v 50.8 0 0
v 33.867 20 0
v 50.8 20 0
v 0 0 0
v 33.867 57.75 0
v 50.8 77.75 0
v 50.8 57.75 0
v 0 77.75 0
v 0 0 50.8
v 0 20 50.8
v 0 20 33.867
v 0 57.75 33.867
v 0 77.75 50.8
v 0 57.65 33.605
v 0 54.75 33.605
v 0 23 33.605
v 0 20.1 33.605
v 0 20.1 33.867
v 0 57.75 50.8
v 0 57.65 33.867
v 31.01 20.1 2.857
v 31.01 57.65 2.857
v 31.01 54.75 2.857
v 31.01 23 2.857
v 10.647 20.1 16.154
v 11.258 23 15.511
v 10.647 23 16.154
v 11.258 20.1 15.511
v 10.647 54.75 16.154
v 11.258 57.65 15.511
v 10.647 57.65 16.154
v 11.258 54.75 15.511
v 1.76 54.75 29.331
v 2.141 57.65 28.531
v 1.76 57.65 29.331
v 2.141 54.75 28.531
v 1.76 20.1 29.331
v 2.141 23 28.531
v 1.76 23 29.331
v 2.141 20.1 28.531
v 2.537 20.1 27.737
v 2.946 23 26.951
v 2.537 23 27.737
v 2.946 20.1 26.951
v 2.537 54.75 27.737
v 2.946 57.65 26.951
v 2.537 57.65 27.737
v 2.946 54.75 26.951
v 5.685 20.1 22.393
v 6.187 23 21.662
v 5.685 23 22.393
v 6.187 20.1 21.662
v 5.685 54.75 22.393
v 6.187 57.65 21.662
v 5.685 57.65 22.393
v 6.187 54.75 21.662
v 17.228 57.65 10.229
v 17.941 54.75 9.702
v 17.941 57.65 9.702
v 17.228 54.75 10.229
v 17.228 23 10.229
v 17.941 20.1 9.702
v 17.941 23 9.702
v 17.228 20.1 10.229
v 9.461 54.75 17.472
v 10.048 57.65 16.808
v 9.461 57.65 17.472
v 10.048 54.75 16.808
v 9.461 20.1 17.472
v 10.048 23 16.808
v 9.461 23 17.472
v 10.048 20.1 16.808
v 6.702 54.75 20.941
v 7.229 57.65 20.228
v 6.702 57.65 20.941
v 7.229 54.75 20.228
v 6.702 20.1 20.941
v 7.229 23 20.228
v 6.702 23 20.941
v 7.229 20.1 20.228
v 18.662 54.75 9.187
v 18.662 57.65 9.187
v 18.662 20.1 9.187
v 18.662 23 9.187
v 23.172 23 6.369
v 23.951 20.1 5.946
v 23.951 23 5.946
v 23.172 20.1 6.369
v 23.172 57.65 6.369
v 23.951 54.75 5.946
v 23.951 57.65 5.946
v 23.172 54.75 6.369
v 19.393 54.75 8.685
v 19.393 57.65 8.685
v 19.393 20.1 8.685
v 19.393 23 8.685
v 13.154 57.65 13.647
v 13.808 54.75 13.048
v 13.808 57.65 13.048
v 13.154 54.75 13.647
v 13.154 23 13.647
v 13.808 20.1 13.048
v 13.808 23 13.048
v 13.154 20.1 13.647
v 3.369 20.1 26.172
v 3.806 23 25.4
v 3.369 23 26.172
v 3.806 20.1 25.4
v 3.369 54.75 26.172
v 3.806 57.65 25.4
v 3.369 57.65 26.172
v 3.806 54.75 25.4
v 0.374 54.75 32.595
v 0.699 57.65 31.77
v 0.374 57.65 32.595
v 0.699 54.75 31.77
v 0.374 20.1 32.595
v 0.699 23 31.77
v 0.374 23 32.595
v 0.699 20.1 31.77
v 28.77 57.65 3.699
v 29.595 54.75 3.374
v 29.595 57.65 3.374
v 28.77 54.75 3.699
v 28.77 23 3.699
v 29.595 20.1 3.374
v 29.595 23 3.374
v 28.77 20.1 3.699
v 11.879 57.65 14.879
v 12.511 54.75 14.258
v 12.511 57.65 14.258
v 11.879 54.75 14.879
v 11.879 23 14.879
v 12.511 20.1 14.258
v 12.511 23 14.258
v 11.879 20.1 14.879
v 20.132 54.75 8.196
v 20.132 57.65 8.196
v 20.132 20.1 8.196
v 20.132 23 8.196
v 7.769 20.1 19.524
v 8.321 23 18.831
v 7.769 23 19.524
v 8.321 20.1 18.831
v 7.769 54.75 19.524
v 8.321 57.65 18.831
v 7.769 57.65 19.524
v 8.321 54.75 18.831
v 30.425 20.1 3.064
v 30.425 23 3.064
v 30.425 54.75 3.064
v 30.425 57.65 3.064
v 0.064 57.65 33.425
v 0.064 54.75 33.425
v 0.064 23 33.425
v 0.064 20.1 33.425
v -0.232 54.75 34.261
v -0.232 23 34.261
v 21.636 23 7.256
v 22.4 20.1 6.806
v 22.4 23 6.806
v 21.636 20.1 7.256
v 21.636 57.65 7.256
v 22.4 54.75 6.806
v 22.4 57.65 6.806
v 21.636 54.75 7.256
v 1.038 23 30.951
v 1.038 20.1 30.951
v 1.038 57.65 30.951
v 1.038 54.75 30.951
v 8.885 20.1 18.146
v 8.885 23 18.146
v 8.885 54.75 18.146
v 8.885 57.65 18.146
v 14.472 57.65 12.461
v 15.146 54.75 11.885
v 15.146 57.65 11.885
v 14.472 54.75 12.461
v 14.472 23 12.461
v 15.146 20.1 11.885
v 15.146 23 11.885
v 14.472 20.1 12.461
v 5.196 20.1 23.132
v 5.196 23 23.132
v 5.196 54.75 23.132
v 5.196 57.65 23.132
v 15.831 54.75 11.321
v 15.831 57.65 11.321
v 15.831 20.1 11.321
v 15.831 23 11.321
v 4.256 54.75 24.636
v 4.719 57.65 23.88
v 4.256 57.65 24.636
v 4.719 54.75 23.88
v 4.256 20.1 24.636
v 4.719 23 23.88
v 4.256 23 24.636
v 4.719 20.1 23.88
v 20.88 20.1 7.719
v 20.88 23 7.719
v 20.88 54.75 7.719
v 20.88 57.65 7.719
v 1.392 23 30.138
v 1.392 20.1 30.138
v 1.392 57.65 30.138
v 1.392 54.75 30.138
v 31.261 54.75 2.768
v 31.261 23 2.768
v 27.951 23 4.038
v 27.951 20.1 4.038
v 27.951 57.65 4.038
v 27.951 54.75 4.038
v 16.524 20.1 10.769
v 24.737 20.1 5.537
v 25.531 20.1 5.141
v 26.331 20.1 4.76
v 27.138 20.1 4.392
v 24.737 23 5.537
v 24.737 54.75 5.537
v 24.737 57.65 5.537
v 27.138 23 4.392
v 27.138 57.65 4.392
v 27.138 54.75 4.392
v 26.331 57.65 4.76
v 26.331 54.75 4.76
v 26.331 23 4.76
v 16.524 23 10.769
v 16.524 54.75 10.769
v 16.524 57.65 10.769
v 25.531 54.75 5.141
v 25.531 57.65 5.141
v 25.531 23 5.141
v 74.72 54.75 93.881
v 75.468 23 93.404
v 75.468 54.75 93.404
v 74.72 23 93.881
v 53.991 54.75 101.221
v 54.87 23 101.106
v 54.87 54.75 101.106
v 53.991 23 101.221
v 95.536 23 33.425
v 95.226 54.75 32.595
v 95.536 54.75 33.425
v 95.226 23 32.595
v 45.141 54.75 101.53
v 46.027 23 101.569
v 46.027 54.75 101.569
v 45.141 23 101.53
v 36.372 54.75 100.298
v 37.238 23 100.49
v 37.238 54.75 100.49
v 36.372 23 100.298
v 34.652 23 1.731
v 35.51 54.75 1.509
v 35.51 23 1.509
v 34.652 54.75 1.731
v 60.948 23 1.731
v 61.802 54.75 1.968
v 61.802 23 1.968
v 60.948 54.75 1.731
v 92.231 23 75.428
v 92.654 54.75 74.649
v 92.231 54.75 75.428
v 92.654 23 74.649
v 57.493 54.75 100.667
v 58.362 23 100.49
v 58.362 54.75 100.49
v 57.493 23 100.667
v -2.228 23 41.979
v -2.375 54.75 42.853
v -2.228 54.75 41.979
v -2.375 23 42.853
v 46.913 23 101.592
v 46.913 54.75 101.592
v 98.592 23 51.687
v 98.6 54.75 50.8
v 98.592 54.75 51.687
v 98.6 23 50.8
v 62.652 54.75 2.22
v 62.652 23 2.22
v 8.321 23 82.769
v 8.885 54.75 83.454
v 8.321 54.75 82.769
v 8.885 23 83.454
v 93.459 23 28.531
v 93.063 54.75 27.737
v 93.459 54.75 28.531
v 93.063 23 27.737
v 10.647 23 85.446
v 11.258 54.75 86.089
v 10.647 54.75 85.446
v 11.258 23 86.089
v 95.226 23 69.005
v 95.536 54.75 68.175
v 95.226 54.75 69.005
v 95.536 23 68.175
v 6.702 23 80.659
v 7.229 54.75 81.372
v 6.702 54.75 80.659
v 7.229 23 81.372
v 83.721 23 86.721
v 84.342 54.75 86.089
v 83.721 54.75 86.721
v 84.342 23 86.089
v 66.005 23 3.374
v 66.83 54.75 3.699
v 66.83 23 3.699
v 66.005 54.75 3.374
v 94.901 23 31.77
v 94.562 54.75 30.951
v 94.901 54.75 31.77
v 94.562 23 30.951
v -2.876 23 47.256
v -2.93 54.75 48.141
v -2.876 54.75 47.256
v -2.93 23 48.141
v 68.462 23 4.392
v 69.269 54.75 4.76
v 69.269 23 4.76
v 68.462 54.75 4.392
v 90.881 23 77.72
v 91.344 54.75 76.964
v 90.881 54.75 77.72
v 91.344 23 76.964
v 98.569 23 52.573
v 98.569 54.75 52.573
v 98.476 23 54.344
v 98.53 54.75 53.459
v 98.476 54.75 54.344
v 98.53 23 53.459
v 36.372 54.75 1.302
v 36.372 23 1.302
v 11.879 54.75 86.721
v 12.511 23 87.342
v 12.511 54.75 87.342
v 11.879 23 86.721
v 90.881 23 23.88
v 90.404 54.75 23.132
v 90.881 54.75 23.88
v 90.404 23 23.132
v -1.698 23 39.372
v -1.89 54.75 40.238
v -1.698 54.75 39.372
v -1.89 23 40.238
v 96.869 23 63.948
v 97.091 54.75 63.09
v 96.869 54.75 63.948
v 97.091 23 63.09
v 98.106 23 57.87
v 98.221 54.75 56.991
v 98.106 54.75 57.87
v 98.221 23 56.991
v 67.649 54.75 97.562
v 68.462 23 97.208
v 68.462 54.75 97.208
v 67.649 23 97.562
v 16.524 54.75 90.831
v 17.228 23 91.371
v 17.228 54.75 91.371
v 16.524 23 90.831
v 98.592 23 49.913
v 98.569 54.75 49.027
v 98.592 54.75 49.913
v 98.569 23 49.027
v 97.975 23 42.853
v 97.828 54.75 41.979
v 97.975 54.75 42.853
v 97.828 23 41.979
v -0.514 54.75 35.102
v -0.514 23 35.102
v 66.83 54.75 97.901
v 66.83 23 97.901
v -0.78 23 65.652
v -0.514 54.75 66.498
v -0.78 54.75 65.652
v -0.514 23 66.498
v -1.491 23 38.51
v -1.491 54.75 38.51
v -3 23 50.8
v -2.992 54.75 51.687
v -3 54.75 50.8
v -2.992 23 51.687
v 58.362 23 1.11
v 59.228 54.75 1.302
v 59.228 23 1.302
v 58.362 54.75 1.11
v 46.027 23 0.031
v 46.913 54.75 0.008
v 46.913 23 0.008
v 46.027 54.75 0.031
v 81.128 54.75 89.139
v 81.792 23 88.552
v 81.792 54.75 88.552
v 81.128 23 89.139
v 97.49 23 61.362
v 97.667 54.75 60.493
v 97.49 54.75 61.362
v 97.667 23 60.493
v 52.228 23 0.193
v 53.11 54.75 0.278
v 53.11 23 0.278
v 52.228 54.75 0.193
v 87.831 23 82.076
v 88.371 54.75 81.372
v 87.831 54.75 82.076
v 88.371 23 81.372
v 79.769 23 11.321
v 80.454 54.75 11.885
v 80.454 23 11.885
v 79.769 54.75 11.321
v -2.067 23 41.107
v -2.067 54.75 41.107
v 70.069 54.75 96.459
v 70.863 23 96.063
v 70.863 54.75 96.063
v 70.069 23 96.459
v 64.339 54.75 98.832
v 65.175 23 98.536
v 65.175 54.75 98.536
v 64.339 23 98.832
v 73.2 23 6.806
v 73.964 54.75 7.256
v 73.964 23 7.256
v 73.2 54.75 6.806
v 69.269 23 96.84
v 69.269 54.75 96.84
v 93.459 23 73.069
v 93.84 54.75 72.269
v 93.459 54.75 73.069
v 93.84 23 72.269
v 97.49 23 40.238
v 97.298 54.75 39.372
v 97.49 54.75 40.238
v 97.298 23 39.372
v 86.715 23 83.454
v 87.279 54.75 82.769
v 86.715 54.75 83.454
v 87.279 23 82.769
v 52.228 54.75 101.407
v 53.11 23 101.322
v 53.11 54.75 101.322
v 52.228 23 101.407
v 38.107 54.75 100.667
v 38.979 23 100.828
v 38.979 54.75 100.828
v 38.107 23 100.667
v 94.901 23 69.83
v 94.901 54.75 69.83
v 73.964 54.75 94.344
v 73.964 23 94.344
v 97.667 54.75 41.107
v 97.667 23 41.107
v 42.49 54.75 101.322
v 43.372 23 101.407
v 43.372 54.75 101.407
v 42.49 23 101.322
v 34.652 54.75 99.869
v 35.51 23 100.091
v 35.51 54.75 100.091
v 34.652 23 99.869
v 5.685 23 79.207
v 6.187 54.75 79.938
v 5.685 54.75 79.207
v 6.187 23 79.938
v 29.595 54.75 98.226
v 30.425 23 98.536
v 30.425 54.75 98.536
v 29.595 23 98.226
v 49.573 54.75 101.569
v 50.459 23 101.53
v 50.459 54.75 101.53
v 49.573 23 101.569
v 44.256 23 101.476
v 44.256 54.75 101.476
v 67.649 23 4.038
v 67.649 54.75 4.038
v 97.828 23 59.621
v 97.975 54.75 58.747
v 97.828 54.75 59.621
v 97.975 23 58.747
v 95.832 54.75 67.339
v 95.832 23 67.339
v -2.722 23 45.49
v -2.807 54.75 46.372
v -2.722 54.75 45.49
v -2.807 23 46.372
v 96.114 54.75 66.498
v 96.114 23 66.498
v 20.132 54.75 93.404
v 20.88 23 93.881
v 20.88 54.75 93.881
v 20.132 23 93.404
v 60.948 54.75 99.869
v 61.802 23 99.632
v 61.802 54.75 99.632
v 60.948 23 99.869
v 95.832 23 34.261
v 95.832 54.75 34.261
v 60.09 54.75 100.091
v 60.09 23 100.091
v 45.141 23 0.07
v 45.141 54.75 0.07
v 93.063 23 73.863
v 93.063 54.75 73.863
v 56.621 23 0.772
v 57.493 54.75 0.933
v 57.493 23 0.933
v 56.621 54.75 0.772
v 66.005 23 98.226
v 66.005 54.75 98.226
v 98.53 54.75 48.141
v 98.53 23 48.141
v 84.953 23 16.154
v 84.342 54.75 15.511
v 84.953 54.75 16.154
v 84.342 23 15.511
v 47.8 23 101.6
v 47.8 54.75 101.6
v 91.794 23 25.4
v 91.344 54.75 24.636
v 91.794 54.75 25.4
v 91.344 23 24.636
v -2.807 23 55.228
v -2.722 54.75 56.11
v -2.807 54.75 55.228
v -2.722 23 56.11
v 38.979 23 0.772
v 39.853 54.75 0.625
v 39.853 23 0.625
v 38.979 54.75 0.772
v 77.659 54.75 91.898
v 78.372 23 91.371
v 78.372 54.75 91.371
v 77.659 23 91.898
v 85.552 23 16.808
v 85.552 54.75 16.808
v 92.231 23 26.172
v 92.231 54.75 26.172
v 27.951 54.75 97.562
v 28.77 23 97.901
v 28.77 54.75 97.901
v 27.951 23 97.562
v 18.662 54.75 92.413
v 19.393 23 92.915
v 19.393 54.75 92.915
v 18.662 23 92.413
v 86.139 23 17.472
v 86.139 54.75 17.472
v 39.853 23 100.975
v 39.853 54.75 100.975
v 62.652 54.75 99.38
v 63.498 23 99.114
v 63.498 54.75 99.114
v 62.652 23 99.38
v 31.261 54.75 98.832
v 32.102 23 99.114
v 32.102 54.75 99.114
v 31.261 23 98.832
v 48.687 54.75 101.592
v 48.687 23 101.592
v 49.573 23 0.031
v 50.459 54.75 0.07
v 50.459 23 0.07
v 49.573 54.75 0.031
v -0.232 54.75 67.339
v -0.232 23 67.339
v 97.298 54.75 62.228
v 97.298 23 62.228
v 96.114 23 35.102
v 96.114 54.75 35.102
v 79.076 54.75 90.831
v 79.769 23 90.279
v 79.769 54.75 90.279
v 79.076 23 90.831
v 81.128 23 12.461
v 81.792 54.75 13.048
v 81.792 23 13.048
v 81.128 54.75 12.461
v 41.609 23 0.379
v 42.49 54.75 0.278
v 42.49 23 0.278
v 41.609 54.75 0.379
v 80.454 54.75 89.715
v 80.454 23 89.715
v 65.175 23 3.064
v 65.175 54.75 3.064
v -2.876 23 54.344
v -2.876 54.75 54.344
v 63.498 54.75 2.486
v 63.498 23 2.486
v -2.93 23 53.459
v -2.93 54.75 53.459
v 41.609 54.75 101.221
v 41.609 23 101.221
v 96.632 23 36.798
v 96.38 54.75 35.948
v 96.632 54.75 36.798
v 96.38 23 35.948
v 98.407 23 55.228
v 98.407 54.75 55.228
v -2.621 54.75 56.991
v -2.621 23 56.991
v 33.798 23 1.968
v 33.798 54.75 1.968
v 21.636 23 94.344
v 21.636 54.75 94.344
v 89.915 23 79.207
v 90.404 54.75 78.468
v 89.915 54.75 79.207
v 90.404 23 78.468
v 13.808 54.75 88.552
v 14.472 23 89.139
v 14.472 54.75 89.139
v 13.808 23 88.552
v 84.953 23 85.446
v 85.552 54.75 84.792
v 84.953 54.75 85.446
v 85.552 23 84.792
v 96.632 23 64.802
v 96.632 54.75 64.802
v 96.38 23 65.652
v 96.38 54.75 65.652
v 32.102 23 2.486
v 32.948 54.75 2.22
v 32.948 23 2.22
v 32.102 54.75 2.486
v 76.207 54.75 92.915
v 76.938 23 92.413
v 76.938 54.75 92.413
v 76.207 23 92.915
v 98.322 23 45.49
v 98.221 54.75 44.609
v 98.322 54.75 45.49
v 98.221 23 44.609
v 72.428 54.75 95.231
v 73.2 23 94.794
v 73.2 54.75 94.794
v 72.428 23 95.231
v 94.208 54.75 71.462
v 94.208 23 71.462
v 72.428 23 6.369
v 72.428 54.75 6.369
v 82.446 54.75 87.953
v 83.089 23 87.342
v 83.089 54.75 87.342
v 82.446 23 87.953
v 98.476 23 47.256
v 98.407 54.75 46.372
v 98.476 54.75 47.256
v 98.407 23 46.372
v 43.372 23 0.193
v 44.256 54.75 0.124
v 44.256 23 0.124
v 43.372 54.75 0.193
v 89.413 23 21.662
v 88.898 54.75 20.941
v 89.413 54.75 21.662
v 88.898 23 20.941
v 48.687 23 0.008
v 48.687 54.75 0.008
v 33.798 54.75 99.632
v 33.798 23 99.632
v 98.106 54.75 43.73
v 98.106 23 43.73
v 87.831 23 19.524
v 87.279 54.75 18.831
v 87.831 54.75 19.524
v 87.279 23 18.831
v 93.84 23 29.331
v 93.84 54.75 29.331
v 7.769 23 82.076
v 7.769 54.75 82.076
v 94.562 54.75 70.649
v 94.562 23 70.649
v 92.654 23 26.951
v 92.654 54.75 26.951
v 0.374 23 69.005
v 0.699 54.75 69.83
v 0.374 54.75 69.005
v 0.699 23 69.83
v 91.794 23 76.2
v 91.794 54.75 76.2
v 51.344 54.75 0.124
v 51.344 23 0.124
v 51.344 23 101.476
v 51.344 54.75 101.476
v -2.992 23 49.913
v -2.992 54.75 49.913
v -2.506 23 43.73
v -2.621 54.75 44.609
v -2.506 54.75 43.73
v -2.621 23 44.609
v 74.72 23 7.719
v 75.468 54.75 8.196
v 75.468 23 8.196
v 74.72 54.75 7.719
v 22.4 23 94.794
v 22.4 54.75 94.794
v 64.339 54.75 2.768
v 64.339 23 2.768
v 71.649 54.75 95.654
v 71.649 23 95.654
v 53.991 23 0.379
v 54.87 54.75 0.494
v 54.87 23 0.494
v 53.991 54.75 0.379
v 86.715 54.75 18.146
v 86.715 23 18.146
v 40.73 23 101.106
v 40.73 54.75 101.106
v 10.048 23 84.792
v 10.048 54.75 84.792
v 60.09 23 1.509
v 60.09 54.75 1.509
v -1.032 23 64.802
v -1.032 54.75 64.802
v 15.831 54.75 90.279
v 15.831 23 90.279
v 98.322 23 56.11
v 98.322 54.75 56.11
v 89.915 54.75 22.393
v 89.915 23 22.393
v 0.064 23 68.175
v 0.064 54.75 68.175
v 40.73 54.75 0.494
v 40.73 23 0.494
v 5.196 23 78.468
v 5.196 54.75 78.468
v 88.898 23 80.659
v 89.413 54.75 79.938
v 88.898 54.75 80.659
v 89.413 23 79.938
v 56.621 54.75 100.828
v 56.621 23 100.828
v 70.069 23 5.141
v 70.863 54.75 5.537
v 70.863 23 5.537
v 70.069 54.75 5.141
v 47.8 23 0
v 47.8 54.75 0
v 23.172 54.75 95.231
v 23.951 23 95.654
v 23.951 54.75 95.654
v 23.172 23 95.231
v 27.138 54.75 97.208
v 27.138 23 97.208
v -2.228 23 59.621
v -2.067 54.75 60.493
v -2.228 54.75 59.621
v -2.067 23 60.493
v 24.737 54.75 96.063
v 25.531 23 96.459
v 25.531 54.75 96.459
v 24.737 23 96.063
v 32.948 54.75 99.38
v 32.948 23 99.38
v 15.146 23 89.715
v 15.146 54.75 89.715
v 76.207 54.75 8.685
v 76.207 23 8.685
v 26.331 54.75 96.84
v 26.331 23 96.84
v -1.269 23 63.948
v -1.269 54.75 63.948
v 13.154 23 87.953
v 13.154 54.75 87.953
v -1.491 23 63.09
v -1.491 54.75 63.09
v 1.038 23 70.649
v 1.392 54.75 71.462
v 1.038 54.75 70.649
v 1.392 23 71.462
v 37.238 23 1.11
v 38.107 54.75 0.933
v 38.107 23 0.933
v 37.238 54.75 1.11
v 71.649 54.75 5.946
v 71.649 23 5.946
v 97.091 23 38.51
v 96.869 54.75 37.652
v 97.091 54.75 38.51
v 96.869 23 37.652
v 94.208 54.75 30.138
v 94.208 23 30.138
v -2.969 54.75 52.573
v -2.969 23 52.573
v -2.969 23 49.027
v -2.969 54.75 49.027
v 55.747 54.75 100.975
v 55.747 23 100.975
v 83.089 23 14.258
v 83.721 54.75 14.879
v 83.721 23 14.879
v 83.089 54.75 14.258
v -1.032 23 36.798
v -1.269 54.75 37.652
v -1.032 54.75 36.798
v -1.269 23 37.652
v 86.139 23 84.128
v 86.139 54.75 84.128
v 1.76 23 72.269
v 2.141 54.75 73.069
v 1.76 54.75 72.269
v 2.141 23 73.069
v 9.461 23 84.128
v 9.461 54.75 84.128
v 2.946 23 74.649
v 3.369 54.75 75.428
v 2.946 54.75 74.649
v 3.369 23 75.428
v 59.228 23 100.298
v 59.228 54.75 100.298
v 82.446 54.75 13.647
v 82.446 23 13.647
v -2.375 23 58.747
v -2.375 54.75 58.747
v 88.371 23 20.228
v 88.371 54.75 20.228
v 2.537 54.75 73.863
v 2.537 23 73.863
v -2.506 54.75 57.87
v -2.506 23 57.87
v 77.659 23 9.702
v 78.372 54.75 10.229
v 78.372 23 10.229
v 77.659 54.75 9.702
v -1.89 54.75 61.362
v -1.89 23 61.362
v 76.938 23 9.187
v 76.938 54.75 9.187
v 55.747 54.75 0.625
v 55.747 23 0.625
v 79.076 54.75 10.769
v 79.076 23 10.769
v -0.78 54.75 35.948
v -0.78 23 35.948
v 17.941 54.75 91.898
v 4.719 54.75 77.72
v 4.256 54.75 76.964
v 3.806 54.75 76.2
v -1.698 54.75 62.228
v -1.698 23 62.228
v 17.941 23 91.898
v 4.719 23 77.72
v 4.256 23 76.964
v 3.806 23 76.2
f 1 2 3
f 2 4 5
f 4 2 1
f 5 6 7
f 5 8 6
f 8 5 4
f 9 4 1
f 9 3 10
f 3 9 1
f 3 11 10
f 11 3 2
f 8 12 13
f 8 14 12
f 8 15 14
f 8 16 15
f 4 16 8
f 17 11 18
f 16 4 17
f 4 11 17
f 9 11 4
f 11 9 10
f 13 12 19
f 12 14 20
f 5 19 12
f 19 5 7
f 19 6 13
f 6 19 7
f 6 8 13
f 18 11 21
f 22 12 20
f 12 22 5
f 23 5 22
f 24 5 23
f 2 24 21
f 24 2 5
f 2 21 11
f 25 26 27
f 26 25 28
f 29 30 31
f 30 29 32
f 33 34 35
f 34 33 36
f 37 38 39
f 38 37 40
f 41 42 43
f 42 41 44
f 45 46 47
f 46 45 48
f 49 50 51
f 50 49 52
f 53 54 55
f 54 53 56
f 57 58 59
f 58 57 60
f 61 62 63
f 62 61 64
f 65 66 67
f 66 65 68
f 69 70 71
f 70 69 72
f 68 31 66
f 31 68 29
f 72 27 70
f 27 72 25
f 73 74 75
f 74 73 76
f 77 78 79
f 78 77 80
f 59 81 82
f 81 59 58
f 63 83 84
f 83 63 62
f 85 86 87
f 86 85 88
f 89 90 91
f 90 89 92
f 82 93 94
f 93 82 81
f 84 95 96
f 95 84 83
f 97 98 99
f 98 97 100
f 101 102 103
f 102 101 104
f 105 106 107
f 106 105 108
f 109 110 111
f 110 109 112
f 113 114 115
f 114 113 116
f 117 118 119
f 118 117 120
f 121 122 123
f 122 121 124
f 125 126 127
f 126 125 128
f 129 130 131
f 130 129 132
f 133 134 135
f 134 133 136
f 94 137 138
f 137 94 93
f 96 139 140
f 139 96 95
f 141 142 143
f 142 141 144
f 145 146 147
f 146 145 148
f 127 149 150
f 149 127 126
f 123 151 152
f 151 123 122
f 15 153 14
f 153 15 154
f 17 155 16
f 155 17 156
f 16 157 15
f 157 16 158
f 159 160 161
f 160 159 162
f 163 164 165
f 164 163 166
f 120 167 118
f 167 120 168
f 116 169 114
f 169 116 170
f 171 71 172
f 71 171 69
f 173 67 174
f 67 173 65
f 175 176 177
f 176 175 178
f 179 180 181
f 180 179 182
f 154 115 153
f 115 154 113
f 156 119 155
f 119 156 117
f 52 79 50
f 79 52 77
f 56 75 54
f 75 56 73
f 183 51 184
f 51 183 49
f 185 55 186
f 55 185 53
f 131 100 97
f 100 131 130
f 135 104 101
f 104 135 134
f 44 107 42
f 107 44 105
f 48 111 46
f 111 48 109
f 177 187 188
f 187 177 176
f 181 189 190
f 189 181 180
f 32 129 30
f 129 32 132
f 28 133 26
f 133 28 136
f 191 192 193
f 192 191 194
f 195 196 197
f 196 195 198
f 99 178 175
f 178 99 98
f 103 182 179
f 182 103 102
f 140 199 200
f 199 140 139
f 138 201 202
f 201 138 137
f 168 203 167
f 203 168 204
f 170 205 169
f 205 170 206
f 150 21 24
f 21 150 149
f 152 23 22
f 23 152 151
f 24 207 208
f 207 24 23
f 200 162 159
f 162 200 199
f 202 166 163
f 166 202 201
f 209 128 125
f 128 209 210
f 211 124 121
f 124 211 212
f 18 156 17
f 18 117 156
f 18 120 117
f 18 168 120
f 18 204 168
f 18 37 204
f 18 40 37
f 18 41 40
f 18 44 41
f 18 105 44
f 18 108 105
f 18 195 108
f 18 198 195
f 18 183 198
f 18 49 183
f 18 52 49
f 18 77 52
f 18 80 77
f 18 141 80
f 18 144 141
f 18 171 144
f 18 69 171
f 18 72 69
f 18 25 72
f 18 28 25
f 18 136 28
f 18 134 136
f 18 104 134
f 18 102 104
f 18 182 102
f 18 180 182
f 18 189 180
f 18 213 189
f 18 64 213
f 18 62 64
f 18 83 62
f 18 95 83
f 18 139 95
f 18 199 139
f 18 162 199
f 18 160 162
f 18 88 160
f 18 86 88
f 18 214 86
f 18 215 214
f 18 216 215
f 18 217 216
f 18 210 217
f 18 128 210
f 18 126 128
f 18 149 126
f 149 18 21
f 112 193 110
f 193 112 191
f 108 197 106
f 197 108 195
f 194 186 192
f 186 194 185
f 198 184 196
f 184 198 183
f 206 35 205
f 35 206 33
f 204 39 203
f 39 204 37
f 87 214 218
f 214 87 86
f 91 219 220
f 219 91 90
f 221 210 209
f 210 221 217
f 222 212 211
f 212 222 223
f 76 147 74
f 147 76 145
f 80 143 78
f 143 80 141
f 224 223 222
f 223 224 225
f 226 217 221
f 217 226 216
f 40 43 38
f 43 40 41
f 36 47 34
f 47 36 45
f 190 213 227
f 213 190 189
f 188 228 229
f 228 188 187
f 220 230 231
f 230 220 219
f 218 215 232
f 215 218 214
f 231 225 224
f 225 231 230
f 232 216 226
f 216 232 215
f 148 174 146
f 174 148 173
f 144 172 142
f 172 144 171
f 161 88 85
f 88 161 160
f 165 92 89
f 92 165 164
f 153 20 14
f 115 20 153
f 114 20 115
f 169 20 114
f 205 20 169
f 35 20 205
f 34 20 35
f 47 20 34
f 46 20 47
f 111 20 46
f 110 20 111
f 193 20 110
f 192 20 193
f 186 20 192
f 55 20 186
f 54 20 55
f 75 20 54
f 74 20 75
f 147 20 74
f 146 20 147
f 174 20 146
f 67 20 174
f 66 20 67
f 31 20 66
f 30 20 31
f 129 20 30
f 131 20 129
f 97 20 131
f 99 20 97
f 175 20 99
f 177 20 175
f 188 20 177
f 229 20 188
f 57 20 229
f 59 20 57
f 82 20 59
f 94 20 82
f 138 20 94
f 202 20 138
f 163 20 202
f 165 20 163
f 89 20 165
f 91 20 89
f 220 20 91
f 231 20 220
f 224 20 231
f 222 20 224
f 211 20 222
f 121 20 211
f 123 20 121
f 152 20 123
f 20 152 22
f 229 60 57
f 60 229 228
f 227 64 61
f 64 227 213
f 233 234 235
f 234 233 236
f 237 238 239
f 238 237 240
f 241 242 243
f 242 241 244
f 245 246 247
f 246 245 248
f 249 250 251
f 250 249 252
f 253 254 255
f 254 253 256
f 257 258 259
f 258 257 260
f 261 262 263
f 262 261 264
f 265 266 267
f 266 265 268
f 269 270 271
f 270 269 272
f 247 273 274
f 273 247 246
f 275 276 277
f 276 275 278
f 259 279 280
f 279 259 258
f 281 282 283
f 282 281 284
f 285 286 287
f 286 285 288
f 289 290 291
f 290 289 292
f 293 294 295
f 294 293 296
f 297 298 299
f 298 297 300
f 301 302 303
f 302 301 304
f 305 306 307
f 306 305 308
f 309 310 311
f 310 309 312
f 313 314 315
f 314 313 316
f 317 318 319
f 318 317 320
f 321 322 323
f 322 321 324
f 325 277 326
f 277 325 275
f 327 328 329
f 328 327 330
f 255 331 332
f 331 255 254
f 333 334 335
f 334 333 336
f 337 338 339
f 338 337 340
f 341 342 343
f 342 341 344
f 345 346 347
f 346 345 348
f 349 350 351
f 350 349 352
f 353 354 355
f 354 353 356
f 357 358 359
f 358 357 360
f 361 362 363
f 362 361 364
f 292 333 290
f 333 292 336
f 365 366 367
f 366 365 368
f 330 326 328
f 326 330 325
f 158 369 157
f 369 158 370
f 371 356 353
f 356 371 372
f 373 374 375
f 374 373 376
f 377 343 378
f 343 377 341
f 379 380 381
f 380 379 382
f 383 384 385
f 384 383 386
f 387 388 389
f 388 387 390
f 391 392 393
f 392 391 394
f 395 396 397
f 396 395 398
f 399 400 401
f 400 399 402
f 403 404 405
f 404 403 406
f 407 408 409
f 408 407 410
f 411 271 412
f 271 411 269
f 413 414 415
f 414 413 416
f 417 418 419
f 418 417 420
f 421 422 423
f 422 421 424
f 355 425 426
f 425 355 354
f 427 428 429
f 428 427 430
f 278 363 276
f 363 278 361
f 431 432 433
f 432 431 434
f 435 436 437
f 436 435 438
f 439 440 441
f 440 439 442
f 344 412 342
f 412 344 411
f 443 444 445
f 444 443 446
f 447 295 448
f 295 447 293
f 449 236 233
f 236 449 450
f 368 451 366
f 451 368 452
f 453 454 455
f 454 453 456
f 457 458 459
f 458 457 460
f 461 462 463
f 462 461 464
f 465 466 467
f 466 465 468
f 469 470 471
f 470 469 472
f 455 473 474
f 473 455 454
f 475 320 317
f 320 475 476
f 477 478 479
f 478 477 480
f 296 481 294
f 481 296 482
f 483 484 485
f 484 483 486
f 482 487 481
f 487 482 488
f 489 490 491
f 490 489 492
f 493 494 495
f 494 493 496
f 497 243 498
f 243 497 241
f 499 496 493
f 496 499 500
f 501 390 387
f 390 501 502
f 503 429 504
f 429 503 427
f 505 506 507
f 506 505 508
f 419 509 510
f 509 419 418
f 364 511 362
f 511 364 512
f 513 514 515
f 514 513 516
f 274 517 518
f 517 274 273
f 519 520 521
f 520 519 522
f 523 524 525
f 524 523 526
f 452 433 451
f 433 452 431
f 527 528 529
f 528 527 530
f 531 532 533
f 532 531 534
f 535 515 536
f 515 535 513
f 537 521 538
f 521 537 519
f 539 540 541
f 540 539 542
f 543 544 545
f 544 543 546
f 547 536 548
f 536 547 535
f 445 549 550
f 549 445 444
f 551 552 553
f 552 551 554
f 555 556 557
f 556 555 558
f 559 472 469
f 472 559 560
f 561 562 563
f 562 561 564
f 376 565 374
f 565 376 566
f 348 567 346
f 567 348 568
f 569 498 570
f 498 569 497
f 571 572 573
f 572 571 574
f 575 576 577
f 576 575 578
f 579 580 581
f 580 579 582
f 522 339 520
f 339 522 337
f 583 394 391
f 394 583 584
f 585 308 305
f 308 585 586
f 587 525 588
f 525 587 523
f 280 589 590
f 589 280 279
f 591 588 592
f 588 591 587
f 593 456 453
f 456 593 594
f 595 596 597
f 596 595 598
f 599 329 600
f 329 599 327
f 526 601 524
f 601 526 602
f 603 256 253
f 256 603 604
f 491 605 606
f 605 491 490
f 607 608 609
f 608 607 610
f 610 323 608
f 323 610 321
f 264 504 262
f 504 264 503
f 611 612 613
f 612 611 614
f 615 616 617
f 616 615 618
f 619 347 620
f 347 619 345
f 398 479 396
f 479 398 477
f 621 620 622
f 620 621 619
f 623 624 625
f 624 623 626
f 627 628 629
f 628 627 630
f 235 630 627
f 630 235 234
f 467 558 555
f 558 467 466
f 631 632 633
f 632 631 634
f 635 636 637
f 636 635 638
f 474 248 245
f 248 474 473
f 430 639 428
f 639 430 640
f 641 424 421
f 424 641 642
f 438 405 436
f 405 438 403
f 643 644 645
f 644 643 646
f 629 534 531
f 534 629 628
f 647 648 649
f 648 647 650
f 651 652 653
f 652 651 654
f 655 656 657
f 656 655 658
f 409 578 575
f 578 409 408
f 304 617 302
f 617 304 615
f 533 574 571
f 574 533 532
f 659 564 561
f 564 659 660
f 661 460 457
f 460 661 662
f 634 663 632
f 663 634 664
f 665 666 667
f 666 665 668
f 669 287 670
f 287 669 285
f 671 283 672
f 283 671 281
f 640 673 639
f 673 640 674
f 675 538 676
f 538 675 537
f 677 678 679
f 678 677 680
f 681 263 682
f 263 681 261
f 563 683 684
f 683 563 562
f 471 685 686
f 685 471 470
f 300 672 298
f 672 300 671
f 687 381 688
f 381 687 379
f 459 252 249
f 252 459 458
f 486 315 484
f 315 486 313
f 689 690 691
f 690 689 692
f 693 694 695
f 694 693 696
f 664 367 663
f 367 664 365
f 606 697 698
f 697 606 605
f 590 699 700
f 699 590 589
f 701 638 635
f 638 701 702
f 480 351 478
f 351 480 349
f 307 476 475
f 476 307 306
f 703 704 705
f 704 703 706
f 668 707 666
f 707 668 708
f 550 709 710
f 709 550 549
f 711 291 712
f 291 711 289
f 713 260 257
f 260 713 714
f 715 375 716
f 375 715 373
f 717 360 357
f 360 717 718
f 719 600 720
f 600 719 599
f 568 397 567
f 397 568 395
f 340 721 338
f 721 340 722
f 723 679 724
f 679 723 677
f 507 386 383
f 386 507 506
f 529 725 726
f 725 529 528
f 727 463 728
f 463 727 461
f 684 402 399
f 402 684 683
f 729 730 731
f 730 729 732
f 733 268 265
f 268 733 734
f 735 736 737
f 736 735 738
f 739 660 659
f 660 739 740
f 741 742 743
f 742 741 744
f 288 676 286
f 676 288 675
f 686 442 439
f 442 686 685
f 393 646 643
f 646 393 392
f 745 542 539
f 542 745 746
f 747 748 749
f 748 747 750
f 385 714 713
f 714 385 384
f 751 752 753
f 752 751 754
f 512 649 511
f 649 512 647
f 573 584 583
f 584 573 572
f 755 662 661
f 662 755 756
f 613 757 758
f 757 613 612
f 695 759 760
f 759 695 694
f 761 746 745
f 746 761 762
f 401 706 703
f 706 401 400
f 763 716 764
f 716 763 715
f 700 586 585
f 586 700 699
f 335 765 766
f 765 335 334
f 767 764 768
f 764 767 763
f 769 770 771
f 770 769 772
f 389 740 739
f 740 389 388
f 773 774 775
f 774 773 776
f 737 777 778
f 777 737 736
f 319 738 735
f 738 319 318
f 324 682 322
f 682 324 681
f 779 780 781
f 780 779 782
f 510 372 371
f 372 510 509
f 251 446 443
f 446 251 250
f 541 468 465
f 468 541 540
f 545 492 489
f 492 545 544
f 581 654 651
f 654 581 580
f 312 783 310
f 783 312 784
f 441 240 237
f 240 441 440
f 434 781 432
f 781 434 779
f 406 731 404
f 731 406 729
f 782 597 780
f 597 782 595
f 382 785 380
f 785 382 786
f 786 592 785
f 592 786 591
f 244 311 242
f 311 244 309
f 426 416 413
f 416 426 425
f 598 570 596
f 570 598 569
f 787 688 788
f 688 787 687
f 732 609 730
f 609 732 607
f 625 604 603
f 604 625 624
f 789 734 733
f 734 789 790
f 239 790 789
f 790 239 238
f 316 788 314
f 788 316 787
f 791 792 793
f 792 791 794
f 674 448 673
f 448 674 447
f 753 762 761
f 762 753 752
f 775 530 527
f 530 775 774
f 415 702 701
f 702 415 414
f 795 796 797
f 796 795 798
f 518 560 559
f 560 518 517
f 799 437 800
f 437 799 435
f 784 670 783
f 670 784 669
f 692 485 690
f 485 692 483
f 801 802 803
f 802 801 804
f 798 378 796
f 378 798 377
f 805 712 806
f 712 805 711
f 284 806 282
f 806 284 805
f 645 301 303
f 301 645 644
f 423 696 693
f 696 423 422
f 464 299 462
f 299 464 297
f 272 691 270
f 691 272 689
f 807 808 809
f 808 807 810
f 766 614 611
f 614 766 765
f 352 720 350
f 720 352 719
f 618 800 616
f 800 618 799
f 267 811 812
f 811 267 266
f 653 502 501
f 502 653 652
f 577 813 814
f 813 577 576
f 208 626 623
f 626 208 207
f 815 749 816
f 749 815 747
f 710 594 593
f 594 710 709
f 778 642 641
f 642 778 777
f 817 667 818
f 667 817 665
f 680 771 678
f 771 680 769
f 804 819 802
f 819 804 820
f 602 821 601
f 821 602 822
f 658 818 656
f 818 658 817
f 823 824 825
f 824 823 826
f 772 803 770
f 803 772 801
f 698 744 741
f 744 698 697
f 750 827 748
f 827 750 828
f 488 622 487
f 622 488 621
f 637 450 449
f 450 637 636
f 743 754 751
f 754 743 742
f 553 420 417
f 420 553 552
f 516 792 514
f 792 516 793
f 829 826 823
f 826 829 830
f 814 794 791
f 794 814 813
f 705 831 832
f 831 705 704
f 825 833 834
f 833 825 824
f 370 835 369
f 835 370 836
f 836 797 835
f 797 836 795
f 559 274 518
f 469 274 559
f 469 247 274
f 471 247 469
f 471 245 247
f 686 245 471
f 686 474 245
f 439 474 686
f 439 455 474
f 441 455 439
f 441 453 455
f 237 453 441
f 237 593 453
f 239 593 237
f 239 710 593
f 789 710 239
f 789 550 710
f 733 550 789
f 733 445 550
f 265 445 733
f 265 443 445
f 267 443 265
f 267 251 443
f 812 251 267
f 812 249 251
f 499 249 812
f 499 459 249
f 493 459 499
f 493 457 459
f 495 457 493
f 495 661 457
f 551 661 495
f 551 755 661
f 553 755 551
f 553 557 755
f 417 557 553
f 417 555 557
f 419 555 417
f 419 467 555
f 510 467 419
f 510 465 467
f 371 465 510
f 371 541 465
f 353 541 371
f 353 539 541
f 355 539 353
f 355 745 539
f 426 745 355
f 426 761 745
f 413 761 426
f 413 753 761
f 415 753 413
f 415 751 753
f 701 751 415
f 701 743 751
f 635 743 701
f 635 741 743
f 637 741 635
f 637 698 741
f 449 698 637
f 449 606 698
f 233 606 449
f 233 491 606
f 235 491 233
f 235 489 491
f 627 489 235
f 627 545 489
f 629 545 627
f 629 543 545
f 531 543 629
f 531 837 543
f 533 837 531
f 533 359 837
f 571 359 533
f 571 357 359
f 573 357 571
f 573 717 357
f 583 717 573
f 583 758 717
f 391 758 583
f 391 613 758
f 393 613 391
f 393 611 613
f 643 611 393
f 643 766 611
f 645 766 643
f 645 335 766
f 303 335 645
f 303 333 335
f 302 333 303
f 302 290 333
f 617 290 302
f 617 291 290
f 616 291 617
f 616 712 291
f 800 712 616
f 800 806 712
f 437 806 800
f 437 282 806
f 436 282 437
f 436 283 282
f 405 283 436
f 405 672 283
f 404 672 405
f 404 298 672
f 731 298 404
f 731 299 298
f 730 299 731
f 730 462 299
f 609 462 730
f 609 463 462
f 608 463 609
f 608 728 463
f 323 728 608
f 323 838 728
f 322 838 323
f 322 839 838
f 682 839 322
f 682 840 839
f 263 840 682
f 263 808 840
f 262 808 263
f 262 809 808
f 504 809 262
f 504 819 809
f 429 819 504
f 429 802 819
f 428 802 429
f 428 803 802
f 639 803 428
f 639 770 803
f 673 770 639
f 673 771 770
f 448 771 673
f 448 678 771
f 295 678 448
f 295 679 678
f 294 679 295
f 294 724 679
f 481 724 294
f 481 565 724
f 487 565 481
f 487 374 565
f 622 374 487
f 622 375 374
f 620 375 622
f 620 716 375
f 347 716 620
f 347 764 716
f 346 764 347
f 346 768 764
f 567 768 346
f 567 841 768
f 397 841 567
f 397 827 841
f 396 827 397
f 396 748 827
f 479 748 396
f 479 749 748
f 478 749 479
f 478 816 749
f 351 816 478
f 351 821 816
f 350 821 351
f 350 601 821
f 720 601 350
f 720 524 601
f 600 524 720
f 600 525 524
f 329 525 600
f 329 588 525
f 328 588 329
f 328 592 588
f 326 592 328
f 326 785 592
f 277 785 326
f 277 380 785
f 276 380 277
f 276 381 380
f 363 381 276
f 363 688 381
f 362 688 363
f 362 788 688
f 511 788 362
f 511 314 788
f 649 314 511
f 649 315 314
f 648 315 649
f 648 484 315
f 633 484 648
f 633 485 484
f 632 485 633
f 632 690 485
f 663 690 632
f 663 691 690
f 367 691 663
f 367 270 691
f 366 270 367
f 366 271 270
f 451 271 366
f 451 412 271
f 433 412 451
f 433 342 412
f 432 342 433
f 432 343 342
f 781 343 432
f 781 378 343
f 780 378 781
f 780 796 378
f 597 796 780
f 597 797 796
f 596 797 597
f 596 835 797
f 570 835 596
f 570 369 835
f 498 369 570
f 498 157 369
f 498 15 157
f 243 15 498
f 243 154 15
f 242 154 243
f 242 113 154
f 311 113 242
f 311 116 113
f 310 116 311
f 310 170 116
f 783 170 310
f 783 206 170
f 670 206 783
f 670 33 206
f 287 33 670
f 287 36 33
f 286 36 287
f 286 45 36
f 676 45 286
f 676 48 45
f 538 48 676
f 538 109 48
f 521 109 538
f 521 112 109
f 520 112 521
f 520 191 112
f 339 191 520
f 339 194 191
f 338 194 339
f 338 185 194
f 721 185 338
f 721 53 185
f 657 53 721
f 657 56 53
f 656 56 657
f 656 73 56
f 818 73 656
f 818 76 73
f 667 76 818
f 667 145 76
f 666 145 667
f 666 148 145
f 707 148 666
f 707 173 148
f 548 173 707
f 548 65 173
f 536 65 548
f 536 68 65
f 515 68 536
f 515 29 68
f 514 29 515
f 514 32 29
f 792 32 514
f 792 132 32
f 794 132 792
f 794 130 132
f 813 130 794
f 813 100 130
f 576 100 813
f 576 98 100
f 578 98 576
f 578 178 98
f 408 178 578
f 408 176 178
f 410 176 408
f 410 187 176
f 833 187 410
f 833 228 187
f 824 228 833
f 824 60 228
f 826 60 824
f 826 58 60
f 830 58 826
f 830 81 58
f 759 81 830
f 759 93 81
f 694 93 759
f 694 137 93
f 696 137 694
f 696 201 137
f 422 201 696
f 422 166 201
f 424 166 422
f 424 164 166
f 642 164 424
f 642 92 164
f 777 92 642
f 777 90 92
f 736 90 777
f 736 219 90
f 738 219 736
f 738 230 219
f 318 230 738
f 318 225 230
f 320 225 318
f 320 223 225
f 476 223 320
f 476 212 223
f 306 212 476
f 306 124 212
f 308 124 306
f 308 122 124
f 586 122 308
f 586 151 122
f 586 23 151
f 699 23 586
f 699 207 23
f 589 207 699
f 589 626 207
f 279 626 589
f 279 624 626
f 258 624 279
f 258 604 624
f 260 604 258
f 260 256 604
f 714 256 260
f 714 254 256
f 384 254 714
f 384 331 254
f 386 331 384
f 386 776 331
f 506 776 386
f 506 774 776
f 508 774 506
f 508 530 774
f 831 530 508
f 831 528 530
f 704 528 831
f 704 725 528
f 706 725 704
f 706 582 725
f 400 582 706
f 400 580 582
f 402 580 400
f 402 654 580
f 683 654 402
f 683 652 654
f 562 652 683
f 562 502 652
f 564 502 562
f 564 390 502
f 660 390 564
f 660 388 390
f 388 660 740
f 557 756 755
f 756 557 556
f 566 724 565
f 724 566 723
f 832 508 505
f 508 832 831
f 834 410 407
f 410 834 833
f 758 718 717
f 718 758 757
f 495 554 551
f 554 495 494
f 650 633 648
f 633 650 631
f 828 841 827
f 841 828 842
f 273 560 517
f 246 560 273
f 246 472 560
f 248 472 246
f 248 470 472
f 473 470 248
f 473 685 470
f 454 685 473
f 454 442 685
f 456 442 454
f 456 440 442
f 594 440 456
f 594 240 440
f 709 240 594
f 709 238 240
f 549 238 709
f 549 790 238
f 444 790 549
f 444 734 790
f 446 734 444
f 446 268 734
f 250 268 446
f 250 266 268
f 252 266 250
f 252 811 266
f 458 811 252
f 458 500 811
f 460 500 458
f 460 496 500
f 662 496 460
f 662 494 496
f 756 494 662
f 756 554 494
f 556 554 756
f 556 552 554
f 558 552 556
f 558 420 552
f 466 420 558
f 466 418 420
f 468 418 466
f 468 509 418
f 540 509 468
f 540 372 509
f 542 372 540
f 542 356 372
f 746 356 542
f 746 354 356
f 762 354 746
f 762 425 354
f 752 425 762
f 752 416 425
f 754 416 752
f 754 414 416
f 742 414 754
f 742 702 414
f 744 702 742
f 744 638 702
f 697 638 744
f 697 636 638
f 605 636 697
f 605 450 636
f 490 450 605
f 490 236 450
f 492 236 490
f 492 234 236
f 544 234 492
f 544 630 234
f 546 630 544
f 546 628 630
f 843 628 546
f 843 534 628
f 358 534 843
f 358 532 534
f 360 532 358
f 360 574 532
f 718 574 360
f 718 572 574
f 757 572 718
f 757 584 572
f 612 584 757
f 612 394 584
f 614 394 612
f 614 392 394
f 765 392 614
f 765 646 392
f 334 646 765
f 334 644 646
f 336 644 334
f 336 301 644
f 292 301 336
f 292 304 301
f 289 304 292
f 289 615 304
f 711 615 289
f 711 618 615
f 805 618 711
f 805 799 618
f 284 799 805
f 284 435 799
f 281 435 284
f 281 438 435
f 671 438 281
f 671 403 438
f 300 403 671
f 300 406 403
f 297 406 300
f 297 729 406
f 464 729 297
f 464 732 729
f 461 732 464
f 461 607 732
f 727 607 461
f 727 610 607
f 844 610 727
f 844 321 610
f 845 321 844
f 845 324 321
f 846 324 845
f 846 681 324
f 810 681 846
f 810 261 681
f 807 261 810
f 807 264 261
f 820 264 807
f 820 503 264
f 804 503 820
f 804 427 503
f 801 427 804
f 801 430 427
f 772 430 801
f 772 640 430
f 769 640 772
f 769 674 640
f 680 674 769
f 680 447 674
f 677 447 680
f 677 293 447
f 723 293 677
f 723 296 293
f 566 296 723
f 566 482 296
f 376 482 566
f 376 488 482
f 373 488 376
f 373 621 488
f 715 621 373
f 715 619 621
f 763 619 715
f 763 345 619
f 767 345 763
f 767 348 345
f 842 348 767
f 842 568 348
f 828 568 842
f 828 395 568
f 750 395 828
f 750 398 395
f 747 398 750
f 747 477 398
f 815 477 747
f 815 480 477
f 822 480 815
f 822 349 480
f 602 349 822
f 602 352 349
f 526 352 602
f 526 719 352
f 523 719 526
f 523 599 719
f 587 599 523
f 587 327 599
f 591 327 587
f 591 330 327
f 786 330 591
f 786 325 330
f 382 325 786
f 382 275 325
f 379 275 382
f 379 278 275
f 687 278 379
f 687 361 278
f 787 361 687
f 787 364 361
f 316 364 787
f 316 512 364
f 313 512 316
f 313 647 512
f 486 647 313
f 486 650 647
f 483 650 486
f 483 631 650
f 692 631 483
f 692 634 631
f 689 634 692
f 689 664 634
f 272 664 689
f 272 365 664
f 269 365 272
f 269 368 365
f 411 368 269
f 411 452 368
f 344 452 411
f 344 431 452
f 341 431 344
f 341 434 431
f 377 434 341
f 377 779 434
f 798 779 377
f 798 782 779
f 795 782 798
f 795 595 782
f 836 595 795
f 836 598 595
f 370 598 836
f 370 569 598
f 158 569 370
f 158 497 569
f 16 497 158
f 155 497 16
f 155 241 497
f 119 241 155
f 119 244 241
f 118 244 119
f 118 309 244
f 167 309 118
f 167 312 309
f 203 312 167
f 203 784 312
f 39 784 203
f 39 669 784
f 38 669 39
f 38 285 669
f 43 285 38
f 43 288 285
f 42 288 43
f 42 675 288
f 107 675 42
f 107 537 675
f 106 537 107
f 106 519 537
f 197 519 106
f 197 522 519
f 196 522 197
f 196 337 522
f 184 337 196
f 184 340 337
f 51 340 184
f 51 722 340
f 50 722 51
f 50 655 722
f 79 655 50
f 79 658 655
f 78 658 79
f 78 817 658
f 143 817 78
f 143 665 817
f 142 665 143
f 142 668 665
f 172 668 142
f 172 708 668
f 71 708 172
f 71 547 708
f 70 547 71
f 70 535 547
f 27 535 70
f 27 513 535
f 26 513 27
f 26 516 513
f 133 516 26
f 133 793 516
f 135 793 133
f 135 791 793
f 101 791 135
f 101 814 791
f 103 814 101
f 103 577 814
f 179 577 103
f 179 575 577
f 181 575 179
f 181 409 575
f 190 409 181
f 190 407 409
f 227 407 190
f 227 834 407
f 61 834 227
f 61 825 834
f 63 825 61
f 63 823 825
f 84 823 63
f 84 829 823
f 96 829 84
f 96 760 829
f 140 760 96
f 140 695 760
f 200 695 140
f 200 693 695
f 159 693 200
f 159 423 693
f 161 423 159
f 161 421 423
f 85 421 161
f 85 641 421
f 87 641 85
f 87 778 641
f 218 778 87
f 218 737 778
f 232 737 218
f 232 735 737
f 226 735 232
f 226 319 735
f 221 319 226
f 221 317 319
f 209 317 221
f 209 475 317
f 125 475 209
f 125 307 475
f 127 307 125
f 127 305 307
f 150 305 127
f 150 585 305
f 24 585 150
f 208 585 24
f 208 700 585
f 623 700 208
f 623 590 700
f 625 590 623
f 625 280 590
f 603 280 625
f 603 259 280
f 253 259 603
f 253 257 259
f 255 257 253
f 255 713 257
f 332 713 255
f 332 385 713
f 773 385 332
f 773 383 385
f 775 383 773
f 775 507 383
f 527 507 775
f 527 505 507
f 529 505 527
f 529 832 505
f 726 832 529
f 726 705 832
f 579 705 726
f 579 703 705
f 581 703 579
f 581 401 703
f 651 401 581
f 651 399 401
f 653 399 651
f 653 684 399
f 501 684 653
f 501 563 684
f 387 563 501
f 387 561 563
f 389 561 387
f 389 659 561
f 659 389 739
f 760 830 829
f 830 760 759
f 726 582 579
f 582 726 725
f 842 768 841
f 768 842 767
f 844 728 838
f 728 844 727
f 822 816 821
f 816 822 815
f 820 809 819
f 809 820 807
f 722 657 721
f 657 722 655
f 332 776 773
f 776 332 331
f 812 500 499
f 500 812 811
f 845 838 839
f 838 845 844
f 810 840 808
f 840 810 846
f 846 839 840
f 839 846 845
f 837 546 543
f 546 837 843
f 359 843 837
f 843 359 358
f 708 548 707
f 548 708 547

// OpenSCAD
// All values are in mm.

// Fragment count. Use this many fragments to make a circle.
$fn = 360;

// Google suggests that the standard shopping cart wheel is 4" in
// diameter and 1.25" in width. That translates to 101.6mm in diameter
// (50.8mm in radius) and 31.75mm in width.

wheel_diameter = 101.6;
wheel_radius = wheel_diameter/2;
wheel_thickness = 31.75;

// As such, the side "guard" height of the chock being the radius
// makes sense because it will give us maximum coverage to prevent the
// wheel from turning if chocking a front wheel
side_height = wheel_radius;

// But, having the center section be lower than that will keep the
// "angle of attack" shallow makes sense.
center_height = wheel_radius * (2/3) ;

// Similarly the side "guard" length should be most of the diameter of
// the wheel.. we'll say half, which is conveniently the diameter. We
// want maximum surface area with minimum wasted material.
side_length = wheel_radius;

// And we'll say that we want the center triangle length to be half
// that of the sides:
// Length of the center triangle
center_length = side_length * (2/3);

// Width of the center triangle (wheel width plus 6mm padding (3mm
// each side))
center_width = wheel_thickness + 6;

// Width of the side triangles, which is just a semi-random number for
// strength/thickness.
side_width = 20;

// No overlap
delta = 0.1;

SidePoints = [
  [           0,          0,           0 ],  // 0
  [ side_length,          0,           0 ],  // 1
  [ side_length, side_width,           0 ],  // 2
  [           0, side_width,           0 ],  // 3
  [           0,          0, side_height ],  // 4
  [           0, side_width, side_height ]]; // 5

CenterPoints = [
  [             0,            0,             0 ],  // 0
  [ center_length,            0,             0 ],  // 1
  [ center_length, center_width,             0 ],  // 2
  [             0, center_width,             0 ],  // 3
  [             0,            0, center_height ],  // 4
  [             0, center_width, center_height ]]; // 5
  
Faces = [
  [0,1,2,3],  // bottom
  [4,1,0]  ,  // front
  [2,1,4,5],  // top
  [5,3,2],    // back
  [5,4,0,3]]; // left

difference() {
    union() {
        // Draw both sides
        polyhedron(SidePoints, Faces);
        
        translate([0, center_width + side_width, 0]){
            polyhedron(SidePoints, Faces);
        }
        
        // Draw center
        translate([0, side_width, 0]){
            polyhedron(CenterPoints, Faces);
        }
    }
    
    // Wheel cylinder relief
    translate([wheel_radius - 3, side_width + (center_width / 2), wheel_radius]) {
        rotate(a=[90,0,0]) {
            cylinder(h = center_width - (delta * 2), r = wheel_radius, center = true);
        }
    }
}

// Wheel cylinder
translate([wheel_radius - 3, side_width + (center_width / 2), wheel_radius]) {
    rotate(a=[90,0,0]) {
        color("blue") {
            cylinder(h = wheel_thickness, r = wheel_radius, center = true);
        }
    }
}
